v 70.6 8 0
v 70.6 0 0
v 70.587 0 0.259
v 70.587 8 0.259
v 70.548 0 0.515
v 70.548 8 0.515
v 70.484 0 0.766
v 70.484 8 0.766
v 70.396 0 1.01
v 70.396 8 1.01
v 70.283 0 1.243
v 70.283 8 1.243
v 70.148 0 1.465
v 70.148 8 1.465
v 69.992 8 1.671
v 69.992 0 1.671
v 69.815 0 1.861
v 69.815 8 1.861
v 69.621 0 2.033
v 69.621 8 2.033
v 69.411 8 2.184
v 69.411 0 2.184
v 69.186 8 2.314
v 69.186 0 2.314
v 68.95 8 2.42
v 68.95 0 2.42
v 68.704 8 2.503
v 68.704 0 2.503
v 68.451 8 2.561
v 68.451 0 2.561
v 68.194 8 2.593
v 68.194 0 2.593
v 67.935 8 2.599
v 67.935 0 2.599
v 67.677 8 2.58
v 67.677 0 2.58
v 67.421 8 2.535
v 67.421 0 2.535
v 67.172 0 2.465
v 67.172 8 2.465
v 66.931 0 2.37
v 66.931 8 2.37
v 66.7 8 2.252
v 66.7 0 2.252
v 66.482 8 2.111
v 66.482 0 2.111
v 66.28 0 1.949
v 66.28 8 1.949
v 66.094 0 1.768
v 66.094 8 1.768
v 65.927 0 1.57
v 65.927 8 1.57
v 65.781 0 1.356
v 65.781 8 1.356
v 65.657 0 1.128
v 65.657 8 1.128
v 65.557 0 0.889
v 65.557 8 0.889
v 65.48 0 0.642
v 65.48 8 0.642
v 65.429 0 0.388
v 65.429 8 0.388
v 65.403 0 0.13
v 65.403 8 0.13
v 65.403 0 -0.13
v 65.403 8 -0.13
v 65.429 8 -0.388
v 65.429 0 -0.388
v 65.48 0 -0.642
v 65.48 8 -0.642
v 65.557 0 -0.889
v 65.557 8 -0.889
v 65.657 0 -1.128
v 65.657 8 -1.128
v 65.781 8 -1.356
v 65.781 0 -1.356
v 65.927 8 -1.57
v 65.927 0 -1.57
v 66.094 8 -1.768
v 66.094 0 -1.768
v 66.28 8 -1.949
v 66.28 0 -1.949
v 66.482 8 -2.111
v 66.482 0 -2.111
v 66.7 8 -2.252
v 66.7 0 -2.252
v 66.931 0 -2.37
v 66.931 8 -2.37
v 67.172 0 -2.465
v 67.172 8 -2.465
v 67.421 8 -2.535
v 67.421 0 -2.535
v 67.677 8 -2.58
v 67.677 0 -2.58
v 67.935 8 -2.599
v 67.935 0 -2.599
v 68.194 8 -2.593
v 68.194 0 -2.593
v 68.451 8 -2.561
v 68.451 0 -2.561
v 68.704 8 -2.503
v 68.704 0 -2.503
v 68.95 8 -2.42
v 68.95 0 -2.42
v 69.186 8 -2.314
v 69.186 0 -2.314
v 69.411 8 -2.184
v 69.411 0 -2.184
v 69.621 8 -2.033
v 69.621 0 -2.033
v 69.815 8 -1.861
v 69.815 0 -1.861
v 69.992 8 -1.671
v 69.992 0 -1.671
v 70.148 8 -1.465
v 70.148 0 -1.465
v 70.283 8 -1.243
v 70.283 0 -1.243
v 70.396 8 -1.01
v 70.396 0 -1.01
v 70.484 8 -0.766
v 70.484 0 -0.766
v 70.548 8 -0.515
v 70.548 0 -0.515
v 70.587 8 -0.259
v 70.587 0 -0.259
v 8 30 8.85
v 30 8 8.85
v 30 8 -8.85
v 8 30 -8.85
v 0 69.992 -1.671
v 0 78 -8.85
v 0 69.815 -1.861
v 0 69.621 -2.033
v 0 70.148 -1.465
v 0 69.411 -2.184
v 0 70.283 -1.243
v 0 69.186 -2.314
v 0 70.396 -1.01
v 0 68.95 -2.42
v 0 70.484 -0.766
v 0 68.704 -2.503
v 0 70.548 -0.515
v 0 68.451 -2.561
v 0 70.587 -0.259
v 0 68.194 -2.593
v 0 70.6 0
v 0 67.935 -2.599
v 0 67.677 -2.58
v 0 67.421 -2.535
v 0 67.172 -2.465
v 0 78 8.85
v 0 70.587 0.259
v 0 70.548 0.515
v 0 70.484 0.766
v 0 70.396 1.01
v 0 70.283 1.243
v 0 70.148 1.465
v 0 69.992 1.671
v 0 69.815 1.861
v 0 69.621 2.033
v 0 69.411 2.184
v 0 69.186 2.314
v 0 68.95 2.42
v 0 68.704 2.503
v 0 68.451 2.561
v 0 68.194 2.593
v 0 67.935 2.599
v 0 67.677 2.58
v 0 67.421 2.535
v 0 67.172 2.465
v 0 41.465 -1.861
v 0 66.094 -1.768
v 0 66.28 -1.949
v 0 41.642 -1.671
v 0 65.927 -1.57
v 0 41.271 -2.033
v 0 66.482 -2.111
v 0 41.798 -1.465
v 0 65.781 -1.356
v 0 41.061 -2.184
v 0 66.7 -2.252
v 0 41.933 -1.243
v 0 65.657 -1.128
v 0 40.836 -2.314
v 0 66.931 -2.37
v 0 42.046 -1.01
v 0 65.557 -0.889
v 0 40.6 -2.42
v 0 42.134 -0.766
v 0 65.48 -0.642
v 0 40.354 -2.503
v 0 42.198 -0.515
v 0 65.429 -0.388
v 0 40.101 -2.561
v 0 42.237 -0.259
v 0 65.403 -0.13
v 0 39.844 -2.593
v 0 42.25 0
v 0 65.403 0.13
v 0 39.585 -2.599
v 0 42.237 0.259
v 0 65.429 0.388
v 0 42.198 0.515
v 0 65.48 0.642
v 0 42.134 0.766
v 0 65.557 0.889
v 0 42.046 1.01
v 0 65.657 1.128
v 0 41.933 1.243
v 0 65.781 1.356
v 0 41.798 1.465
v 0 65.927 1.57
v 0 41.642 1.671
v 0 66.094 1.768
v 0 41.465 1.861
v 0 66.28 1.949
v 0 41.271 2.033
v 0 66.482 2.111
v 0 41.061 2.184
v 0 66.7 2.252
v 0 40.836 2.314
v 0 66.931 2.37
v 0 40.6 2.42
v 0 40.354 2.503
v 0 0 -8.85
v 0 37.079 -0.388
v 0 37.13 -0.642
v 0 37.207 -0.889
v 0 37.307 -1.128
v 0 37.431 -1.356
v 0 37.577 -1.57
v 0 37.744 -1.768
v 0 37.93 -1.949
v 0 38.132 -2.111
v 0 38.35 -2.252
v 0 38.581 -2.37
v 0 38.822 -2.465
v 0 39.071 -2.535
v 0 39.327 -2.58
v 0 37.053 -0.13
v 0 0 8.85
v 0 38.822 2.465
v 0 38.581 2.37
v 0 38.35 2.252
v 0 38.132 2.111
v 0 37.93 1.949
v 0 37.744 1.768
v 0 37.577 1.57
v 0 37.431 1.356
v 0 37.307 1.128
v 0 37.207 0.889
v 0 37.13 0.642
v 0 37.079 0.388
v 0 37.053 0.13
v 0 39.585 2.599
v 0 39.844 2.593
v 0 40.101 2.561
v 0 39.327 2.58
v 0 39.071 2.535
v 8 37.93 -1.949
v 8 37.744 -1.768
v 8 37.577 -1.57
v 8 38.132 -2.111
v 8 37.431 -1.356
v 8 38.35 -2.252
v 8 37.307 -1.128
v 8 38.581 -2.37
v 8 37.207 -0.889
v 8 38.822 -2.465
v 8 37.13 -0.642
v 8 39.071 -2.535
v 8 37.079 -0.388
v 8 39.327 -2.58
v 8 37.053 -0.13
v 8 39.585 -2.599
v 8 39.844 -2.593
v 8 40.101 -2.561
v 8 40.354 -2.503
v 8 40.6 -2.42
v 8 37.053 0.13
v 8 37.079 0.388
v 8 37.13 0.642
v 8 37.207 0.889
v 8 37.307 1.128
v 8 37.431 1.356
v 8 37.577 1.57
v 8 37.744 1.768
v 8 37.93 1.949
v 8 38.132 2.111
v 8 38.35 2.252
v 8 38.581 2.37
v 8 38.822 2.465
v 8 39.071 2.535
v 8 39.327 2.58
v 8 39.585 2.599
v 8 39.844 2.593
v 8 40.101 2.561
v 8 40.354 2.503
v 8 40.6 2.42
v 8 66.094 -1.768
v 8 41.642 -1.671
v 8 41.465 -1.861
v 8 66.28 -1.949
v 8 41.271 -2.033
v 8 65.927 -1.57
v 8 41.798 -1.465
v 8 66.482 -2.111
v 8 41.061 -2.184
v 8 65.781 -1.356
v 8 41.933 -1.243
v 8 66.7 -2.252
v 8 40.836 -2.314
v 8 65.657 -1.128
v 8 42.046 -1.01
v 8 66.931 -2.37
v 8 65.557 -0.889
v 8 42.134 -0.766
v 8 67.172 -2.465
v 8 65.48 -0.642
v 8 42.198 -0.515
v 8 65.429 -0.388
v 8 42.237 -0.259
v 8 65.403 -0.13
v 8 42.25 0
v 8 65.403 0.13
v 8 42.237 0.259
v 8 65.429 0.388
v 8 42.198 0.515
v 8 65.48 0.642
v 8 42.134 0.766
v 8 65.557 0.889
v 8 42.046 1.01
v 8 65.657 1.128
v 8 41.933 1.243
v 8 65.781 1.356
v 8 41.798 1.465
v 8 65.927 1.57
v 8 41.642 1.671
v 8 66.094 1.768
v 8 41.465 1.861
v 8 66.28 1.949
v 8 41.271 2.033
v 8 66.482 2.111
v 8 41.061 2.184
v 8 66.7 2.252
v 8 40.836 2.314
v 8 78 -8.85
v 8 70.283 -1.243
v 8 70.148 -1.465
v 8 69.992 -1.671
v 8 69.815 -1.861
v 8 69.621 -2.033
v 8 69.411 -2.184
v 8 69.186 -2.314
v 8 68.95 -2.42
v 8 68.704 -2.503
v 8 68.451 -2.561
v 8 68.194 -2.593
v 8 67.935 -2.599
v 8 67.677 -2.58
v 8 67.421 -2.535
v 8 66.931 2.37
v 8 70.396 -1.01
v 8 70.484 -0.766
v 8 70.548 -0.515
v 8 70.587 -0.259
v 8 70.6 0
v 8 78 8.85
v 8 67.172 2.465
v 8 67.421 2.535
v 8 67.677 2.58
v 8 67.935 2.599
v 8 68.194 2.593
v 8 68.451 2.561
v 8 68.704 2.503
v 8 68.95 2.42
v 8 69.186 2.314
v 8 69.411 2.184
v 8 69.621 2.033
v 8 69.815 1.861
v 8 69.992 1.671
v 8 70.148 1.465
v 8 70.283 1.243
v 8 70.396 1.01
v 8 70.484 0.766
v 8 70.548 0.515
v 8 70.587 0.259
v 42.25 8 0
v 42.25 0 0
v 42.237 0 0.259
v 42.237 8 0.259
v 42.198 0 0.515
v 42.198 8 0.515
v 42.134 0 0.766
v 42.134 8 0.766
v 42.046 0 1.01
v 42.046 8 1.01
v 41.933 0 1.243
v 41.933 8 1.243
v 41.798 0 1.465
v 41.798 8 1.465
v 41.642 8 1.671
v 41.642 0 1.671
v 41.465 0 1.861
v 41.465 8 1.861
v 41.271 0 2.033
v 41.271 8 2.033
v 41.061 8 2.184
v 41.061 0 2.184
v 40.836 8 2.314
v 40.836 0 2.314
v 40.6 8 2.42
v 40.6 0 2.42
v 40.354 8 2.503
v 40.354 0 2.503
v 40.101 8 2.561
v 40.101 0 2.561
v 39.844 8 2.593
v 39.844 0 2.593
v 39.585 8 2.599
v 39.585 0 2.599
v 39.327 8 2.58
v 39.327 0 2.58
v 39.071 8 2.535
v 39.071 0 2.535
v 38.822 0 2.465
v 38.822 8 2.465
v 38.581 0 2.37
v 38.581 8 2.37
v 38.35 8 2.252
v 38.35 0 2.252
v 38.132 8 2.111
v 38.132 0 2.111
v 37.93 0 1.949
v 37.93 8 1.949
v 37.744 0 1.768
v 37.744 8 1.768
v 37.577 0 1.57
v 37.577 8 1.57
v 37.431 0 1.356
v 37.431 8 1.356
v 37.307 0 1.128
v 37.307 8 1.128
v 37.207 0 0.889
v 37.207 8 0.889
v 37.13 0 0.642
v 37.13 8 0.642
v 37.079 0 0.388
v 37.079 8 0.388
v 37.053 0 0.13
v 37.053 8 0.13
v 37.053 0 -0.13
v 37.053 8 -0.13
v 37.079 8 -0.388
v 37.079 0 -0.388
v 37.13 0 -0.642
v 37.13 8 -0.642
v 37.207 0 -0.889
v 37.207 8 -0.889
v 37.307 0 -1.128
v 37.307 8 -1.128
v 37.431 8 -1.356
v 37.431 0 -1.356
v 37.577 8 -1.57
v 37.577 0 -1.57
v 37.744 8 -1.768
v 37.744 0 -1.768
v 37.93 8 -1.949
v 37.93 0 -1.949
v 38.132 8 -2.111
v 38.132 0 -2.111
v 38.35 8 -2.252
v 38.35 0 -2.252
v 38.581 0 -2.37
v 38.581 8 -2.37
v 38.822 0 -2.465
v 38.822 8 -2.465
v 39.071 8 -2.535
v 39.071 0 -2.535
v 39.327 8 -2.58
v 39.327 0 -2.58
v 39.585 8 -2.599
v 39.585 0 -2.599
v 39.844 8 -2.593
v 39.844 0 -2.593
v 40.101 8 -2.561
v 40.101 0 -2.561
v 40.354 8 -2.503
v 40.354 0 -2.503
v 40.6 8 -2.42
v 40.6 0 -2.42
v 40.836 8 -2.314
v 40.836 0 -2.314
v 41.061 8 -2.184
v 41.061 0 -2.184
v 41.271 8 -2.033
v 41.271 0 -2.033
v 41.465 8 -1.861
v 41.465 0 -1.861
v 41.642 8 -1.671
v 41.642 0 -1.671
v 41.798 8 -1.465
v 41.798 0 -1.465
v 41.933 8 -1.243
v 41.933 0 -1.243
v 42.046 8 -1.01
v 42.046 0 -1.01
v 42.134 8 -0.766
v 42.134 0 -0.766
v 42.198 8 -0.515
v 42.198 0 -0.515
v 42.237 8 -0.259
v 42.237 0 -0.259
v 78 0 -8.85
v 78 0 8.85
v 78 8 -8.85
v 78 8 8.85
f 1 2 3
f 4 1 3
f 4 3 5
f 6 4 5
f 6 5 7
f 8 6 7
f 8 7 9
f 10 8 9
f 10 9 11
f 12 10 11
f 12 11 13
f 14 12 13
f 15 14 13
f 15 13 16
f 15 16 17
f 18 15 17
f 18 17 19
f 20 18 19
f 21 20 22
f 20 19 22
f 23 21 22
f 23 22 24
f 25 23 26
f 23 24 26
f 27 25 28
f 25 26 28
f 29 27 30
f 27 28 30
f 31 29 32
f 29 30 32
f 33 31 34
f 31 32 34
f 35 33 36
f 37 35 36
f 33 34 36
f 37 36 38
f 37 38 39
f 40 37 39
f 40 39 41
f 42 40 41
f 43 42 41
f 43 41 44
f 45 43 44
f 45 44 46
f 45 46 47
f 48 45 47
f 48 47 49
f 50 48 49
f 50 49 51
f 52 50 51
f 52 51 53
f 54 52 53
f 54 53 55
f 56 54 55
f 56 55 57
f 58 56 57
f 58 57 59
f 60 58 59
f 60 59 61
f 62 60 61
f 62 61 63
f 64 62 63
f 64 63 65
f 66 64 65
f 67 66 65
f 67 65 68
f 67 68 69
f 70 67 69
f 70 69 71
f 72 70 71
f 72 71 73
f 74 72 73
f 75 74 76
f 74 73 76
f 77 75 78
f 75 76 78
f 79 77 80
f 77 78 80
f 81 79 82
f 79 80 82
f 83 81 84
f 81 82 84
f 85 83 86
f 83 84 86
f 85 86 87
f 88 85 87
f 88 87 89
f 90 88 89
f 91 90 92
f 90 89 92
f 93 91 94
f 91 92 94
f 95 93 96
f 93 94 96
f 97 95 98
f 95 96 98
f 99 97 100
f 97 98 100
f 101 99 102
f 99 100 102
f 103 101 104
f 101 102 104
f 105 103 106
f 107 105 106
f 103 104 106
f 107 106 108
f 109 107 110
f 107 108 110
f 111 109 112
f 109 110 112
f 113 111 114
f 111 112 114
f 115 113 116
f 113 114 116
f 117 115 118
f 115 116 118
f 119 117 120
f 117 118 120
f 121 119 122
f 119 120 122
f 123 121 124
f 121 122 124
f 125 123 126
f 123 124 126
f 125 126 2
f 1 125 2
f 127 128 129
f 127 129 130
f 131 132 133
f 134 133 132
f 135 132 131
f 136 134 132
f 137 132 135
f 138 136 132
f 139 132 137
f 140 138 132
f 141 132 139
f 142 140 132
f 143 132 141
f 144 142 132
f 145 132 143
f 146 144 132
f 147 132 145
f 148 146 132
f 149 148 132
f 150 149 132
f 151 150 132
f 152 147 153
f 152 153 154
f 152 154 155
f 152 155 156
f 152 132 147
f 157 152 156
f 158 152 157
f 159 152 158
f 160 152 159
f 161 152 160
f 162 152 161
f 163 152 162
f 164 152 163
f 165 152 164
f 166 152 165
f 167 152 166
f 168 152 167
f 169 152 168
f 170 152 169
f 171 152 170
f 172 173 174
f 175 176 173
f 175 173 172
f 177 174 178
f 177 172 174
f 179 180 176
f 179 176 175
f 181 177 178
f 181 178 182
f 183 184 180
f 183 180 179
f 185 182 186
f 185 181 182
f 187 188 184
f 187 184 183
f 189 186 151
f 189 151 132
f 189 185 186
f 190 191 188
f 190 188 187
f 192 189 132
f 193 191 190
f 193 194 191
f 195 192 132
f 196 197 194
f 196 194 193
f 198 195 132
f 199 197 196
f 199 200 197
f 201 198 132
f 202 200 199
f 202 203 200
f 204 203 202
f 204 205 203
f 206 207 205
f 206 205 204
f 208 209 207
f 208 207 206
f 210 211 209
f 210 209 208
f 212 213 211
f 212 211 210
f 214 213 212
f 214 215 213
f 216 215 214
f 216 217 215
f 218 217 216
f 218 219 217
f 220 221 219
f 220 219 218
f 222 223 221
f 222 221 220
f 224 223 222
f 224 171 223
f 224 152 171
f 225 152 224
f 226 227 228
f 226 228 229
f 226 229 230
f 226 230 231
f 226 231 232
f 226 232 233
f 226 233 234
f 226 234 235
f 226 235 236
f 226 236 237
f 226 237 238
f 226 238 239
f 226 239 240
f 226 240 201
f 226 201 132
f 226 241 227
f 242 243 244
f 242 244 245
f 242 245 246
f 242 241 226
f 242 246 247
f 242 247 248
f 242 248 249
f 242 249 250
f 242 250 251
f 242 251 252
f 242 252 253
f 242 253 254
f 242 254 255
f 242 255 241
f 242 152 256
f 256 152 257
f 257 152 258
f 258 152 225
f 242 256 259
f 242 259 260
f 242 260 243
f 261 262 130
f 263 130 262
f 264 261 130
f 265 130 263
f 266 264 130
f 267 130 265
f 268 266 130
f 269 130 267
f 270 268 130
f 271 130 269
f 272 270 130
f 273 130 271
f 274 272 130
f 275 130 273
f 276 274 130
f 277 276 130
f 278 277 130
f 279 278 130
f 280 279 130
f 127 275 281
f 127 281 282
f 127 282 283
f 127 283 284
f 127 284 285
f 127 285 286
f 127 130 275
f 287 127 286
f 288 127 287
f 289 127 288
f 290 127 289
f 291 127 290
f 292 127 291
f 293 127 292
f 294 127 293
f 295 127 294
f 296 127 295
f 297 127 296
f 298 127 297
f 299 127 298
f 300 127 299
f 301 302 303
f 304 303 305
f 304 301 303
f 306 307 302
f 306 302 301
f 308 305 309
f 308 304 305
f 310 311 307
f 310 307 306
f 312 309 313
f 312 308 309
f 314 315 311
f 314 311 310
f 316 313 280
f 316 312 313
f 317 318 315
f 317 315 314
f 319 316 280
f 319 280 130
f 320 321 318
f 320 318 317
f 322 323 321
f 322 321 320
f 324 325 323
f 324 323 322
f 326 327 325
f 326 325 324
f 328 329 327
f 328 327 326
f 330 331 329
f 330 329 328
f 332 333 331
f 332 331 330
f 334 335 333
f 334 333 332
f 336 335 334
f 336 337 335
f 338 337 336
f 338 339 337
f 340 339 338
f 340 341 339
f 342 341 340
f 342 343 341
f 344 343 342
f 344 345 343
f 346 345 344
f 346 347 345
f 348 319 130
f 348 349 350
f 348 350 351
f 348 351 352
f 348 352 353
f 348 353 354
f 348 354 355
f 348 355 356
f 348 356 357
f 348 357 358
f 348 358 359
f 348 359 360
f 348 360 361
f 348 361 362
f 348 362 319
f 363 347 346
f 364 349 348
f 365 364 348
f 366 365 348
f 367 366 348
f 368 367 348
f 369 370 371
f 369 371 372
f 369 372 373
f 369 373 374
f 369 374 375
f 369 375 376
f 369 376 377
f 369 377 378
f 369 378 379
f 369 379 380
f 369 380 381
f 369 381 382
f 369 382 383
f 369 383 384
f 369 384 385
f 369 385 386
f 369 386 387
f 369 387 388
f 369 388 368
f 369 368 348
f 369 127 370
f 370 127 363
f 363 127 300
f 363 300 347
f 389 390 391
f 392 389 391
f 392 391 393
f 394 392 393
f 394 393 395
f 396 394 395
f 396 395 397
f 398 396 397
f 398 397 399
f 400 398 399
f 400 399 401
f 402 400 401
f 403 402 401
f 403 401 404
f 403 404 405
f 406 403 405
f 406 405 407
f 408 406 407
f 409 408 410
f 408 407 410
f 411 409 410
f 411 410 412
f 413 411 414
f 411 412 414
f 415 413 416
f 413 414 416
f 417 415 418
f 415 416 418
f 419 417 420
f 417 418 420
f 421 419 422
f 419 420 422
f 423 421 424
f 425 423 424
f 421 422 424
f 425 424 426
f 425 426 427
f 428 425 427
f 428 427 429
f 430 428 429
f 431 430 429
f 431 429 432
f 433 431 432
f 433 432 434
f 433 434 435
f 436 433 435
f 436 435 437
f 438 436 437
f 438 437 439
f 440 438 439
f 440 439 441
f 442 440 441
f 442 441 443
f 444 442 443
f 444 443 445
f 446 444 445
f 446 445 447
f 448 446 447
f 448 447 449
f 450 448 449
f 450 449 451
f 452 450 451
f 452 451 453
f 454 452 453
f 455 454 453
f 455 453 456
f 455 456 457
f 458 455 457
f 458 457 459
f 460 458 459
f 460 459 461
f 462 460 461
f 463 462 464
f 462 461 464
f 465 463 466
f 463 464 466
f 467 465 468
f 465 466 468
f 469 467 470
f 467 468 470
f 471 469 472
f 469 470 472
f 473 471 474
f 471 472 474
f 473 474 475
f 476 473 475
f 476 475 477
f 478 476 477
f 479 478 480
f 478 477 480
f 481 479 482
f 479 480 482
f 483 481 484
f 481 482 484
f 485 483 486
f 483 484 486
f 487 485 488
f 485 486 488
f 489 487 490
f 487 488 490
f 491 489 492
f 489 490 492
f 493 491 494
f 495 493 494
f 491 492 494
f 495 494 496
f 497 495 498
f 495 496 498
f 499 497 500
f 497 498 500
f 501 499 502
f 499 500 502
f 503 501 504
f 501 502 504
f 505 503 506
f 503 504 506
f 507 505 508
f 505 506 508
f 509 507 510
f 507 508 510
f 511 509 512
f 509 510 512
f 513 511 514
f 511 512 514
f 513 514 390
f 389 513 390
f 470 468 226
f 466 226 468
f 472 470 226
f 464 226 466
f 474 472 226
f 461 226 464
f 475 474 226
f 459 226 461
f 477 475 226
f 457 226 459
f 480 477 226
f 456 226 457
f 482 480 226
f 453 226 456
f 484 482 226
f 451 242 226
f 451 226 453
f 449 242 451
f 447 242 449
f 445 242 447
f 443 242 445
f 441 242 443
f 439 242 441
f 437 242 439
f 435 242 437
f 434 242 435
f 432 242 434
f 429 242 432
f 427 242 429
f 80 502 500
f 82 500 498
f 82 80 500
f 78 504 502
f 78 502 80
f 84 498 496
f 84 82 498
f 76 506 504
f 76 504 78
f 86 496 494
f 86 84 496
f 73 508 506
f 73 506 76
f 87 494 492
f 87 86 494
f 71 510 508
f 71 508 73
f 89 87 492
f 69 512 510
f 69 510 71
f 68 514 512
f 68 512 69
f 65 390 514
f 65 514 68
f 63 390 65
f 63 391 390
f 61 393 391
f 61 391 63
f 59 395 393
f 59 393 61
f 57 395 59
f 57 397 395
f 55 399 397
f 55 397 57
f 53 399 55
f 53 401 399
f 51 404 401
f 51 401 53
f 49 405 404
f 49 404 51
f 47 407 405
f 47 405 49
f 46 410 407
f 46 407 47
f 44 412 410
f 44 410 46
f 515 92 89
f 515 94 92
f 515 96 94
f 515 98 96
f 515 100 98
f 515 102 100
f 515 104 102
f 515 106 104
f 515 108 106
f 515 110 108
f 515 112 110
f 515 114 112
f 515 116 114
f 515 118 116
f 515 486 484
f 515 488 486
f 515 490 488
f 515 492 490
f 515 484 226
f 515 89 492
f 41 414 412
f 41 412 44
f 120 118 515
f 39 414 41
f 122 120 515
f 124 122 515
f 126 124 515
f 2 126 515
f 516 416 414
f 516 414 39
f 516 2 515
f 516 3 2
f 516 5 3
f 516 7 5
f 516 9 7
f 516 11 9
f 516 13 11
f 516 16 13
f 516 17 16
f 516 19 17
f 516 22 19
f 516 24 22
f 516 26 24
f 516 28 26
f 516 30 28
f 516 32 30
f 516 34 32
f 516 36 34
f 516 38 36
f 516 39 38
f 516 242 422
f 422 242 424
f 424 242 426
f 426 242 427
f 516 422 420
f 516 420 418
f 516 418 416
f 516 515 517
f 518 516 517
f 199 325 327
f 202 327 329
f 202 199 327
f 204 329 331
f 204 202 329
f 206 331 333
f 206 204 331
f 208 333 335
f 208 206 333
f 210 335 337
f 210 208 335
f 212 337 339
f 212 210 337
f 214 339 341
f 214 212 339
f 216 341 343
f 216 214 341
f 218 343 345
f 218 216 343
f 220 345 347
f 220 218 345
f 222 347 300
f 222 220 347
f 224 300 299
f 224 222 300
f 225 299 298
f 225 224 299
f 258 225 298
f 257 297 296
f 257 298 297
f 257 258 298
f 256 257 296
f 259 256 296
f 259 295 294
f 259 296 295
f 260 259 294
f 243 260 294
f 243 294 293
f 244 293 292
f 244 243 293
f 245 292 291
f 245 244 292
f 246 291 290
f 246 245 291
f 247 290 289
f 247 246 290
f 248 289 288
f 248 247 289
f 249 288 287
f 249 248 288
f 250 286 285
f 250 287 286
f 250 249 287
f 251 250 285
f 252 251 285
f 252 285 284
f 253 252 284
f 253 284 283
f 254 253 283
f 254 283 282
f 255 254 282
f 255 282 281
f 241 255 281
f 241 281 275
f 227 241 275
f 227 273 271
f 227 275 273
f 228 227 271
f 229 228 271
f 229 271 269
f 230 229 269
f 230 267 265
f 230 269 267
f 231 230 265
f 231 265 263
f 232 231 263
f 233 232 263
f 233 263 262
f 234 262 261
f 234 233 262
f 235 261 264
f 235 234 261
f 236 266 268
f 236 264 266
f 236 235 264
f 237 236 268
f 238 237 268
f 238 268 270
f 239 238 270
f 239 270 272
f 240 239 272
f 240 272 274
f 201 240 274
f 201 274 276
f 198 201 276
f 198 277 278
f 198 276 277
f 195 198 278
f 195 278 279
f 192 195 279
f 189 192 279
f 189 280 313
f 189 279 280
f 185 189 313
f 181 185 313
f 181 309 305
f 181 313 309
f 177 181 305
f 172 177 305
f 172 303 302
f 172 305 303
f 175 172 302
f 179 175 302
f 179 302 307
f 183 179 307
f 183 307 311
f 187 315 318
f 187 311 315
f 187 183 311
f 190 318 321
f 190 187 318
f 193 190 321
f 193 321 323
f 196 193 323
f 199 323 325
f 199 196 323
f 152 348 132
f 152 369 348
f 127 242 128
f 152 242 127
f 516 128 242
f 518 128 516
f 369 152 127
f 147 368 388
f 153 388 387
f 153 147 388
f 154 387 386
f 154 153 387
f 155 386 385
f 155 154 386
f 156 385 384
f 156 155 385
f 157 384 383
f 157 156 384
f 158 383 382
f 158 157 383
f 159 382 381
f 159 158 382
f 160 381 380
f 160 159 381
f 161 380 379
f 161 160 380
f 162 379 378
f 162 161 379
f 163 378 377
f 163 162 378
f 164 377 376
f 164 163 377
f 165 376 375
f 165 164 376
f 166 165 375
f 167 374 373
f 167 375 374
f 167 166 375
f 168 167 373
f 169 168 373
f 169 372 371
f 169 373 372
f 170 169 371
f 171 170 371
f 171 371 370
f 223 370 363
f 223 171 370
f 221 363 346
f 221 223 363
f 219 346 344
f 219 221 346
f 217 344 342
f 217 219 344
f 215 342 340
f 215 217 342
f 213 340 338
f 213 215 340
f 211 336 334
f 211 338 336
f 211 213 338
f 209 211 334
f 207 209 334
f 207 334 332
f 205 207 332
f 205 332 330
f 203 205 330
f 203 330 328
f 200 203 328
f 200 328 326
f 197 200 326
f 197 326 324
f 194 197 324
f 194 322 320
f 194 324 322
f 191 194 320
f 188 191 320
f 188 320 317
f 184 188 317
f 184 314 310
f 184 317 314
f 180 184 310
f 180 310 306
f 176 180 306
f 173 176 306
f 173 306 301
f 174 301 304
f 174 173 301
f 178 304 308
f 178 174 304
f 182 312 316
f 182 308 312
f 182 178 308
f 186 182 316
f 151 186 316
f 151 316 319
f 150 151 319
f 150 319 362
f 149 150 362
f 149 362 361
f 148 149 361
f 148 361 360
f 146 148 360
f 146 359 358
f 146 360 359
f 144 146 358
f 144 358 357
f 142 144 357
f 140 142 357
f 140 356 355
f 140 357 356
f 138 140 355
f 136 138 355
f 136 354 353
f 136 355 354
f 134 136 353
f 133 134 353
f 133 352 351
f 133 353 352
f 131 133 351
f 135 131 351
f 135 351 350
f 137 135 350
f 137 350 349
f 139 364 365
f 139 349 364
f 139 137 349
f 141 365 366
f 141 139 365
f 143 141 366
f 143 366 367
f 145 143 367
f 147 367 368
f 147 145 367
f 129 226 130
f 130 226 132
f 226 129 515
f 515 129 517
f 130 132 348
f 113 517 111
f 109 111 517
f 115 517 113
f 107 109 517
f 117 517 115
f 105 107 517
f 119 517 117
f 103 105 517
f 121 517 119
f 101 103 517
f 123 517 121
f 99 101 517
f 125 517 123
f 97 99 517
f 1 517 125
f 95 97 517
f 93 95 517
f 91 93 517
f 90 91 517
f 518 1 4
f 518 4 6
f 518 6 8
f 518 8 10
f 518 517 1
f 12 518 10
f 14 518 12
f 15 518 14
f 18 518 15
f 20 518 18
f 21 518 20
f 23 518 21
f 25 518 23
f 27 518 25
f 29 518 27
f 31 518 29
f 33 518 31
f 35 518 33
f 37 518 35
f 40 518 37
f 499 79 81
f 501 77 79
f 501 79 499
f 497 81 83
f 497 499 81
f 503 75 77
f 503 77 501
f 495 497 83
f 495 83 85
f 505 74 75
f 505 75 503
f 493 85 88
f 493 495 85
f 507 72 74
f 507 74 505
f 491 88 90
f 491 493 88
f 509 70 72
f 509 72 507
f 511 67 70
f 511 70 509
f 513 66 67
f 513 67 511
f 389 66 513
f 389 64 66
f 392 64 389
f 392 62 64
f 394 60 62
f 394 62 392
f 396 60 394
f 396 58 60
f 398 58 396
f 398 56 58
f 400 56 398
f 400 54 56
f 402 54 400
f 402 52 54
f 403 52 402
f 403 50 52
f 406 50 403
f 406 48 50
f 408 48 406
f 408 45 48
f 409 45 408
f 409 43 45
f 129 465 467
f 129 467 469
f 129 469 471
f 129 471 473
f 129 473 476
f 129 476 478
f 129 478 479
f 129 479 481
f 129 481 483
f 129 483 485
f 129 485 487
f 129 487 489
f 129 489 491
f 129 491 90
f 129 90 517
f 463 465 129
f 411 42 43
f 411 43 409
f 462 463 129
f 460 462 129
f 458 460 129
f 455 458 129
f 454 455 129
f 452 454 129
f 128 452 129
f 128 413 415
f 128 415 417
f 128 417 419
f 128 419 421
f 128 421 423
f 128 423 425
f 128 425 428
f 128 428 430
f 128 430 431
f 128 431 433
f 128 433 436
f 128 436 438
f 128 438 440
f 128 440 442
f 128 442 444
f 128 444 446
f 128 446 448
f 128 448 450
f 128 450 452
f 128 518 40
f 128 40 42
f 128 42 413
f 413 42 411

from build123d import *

# Parameters (mm, degrees)
PAD_DEPTH       = 8.85
SKETCH001_R     = 2.6
POCKET_DEPTH    = 78.001
SKETCH002_R     = 2.6
POCKET001_DEPTH = 78.001


with BuildPart() as part:
    # Sketch → Pad (new body, symmetric)
    with BuildSketch(Plane.XY):
        Polygon((0, 78), (0, 0), (78, 0), (78, 8), (30, 8), (8, 30), (8, 78), align=None)
    extrude(amount=PAD_DEPTH, both=True)

    # Sketch001 → Pocket (cut, through all)
    with BuildSketch(Plane.XZ):
        with Locations((39.65, 0)):
            Circle(SKETCH001_R)
        with Locations((68, 0)):
            Circle(SKETCH001_R)
    extrude(amount=-POCKET_DEPTH, mode=Mode.SUBTRACT)

    # Sketch002 → Pocket001 (cut, through all)
    with BuildSketch(Plane.YZ):
        with Locations((39.65, 0)):
            Circle(SKETCH002_R)
        with Locations((68, 0)):
            Circle(SKETCH002_R)
    extrude(amount=POCKET001_DEPTH, mode=Mode.SUBTRACT)


solid = part.part
